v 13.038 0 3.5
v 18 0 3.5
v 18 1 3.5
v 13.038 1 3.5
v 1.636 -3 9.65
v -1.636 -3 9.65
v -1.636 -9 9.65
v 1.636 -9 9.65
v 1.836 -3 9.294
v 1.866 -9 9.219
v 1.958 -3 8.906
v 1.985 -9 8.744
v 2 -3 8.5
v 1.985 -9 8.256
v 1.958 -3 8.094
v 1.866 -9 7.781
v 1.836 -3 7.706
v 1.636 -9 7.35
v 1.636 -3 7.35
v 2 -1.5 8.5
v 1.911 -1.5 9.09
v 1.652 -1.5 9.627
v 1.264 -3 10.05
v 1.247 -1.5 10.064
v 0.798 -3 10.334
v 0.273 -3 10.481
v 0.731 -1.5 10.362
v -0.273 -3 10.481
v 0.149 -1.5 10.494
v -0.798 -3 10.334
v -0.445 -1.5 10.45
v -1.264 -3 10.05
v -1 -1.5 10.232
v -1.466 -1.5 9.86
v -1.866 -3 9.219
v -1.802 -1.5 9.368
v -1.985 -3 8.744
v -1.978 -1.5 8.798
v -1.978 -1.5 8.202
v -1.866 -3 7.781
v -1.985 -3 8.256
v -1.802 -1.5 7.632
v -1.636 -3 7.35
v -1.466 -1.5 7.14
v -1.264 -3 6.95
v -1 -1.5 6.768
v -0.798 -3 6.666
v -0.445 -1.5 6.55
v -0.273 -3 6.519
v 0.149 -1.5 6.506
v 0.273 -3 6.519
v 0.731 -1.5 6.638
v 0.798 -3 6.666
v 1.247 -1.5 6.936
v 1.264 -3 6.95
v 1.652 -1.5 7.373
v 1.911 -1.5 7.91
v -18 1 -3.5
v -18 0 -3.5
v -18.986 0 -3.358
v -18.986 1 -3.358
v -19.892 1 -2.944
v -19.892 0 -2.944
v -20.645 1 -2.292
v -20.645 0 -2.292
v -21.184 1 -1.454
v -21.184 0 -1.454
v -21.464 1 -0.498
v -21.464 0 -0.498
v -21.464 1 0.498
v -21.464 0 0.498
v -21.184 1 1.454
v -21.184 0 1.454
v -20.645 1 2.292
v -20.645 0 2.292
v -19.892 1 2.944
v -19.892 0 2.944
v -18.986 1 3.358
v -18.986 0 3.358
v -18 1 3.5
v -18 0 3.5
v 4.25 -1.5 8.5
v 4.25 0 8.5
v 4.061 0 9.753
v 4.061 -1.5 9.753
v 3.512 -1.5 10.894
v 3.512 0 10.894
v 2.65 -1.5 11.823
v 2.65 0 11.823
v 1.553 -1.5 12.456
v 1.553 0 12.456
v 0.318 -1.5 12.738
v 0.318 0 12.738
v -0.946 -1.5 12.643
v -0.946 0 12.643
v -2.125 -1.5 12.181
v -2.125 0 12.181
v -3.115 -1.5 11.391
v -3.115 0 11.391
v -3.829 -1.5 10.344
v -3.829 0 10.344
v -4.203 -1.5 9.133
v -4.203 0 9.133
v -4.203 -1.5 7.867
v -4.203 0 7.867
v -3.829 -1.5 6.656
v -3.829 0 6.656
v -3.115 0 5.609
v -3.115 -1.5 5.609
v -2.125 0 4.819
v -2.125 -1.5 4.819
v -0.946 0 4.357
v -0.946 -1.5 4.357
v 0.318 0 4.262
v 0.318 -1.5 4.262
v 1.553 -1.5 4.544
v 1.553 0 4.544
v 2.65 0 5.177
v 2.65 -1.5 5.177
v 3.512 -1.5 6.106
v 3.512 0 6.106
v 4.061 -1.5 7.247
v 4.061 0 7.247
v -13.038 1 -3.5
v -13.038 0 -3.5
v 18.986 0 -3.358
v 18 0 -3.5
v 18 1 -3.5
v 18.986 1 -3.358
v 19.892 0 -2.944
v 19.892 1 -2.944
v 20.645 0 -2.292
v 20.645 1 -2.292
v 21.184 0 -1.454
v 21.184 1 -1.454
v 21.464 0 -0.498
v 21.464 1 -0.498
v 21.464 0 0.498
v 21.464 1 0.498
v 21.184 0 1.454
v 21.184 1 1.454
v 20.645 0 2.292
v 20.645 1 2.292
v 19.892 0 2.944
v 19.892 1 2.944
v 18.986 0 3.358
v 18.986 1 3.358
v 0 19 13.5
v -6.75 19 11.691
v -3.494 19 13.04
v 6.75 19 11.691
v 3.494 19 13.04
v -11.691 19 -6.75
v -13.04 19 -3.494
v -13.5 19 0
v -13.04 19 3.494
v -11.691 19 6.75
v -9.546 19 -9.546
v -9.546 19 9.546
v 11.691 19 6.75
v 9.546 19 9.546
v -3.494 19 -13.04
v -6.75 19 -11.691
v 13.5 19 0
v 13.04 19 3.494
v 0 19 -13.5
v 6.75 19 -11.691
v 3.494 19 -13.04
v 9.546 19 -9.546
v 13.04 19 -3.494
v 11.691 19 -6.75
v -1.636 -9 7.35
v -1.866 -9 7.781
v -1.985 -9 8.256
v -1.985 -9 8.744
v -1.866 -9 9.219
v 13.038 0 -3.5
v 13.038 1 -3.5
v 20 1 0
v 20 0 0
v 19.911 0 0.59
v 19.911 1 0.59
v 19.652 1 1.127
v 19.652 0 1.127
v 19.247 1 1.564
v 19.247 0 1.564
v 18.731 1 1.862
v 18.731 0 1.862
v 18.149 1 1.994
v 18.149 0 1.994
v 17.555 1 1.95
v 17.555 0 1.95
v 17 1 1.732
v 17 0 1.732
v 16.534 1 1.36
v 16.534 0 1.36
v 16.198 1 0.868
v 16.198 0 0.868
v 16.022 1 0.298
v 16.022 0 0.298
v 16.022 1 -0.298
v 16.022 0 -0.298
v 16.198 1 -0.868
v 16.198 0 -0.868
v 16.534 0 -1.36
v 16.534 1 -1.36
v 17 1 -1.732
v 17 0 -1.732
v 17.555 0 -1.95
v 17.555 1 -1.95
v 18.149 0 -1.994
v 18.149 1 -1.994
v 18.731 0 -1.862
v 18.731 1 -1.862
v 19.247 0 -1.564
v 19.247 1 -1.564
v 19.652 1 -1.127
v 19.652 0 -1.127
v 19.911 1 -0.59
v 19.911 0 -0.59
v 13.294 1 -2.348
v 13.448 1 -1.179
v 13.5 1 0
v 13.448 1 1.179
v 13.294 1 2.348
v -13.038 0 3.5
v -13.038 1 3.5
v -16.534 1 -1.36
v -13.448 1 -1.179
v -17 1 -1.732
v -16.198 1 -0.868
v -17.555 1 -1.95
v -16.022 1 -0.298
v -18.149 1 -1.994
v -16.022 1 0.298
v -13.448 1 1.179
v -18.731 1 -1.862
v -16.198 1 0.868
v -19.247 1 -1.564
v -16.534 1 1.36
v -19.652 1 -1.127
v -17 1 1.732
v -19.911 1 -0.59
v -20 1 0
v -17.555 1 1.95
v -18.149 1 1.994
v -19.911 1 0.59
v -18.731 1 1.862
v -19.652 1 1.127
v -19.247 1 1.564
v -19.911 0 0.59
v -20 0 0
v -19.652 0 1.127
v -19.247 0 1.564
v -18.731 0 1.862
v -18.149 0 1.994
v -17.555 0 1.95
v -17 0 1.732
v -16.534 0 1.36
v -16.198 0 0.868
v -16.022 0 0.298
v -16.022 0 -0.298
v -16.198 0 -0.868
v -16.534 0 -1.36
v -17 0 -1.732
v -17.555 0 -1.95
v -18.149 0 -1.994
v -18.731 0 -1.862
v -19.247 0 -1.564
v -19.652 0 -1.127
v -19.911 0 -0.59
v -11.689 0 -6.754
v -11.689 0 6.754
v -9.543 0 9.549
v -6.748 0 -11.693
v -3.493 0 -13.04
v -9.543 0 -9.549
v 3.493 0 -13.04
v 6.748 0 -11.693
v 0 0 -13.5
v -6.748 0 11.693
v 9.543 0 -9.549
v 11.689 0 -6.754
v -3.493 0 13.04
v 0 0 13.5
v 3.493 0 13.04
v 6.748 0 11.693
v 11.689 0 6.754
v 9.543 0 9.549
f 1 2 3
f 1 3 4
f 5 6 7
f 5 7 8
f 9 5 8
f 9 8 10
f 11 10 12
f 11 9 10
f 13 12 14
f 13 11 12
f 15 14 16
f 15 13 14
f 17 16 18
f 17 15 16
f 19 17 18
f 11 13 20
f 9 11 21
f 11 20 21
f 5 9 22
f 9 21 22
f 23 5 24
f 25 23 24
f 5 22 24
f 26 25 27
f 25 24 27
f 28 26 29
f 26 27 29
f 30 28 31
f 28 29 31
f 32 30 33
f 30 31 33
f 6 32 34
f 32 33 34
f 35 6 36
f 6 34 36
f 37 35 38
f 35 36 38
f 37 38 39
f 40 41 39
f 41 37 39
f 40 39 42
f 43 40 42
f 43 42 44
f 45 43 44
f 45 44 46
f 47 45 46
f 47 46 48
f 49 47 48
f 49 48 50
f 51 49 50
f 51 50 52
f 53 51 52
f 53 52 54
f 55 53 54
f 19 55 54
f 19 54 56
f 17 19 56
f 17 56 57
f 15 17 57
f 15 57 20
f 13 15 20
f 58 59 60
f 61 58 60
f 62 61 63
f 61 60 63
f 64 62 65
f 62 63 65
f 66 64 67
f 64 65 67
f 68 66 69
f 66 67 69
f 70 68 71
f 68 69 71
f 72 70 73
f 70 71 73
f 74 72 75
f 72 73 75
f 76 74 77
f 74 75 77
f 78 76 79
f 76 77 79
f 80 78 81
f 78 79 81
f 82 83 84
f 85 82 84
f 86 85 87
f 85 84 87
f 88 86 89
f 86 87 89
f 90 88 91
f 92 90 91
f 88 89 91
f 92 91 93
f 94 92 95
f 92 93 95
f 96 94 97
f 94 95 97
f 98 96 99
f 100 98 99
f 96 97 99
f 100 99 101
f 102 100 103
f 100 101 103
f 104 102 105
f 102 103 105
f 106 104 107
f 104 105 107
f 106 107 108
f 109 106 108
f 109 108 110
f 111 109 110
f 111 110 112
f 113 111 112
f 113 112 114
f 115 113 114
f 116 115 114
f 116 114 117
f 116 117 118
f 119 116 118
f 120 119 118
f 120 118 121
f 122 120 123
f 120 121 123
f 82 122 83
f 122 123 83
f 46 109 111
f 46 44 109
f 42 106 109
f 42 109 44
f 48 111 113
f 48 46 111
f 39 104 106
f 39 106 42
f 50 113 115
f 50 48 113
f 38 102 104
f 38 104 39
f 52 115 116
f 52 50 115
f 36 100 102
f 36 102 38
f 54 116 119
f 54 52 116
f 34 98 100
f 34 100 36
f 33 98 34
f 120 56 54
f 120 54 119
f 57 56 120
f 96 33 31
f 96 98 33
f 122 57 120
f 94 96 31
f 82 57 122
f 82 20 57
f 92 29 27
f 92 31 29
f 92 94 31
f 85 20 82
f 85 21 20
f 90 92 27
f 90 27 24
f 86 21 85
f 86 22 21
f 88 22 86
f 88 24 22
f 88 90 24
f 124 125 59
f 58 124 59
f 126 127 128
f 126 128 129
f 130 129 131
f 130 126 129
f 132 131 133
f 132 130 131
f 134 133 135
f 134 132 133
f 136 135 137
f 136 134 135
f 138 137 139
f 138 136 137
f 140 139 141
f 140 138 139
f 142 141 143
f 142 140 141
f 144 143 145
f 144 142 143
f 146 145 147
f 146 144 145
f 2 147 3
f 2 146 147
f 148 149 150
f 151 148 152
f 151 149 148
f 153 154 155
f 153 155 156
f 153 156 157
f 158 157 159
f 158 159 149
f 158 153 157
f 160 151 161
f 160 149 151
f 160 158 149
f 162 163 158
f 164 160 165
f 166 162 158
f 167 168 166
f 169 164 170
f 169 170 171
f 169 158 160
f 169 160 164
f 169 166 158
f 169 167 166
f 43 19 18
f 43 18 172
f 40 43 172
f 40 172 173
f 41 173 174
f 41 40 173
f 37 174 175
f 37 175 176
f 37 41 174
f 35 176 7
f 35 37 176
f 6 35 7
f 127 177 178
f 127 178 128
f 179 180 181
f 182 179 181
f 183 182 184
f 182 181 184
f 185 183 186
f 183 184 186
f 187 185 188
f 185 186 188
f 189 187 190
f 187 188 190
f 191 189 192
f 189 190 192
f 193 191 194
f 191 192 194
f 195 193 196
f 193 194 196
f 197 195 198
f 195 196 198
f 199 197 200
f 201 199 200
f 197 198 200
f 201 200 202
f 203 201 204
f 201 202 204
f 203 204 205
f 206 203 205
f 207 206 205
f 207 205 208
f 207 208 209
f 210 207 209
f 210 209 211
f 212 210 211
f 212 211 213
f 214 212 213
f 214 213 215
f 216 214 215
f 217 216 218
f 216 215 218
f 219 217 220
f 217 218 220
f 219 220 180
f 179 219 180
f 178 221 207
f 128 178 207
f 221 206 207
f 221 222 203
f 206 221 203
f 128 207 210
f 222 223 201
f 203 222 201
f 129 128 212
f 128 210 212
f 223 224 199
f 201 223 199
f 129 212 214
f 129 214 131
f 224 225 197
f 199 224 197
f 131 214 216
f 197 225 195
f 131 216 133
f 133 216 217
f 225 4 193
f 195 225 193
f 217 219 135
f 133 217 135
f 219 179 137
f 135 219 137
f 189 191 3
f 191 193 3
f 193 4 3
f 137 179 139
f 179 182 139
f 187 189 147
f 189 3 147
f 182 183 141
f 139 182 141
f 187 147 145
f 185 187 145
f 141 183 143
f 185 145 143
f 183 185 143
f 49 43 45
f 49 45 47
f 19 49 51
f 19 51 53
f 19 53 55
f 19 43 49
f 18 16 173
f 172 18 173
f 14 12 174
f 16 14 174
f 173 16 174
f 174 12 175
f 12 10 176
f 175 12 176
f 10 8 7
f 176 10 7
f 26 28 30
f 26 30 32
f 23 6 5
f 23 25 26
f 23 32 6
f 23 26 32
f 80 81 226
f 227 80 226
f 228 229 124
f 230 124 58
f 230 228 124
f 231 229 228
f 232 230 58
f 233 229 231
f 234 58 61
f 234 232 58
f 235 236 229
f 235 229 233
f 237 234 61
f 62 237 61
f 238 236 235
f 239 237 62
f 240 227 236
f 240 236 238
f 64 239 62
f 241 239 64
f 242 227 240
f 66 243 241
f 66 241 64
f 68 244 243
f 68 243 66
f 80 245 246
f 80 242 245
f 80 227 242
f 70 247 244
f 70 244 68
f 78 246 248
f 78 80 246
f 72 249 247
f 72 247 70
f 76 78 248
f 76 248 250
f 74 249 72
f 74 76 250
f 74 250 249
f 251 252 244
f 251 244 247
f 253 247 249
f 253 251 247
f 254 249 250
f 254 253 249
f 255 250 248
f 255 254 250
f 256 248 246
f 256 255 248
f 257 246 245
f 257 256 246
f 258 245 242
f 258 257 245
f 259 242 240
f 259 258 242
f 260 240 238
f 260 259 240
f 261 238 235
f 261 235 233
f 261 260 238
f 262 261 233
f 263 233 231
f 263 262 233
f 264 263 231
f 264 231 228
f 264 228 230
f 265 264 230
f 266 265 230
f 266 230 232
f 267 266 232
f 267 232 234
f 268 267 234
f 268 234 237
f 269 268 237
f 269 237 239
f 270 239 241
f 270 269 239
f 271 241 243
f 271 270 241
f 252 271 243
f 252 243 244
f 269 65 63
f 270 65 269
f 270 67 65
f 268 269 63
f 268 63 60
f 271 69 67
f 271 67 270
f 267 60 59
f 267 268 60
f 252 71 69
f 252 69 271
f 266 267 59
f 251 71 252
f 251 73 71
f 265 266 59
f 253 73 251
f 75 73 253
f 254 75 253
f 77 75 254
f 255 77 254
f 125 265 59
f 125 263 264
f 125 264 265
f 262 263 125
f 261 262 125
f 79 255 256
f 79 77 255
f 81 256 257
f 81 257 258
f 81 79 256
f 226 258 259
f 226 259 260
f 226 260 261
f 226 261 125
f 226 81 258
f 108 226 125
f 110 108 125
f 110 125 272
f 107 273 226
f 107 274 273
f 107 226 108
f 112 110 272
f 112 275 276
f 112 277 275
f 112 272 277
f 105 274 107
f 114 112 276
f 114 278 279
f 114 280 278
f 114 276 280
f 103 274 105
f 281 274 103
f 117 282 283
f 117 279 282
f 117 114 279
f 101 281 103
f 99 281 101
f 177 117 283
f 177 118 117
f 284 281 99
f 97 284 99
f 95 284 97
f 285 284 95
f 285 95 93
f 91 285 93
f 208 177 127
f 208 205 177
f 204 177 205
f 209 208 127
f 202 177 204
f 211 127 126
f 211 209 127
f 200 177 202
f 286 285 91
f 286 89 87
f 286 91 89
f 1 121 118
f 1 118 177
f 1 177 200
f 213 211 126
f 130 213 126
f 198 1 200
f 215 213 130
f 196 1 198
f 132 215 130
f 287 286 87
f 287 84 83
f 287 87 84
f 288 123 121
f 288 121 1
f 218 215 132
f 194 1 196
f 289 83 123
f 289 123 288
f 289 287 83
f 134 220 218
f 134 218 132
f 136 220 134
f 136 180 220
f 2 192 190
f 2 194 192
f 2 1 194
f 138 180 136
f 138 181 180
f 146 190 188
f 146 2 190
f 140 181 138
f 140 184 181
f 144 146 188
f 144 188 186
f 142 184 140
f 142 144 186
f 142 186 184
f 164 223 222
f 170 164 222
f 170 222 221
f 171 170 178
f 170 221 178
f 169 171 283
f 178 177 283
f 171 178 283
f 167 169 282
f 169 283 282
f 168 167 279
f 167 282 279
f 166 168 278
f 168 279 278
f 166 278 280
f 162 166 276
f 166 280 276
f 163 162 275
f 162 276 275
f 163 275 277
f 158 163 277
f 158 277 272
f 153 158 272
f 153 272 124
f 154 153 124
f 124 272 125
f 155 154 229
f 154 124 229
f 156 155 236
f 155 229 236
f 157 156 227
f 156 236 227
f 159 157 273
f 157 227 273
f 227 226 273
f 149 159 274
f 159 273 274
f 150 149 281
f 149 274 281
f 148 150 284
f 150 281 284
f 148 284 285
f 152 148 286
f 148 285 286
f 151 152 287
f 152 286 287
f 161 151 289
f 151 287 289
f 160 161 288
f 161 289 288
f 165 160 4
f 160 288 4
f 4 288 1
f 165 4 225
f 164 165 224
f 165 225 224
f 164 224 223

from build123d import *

# Parameters (mm, degrees)
SKETCH1_R           = 13.5
BOSS_EXTRUDE1_DEPTH = 19
SKETCH2_R           = 2
BOSS_EXTRUDE2_DEPTH = 1
SKETCH4_R           = 4.25
BOSS_EXTRUDE3_DEPTH = 1.5
SKETCH5_R           = 2
BOSS_EXTRUDE4_DEPTH = 1.5
BOSS_EXTRUDE5_DEPTH = 6


with BuildPart() as part:
    # Sketch1 → Boss-Extrude1 (new body)
    with BuildSketch(Plane(origin=(0, 0, 0), x_dir=(1, 0, 0), z_dir=(0, 1, 0))):
        Circle(SKETCH1_R)
    extrude(amount=BOSS_EXTRUDE1_DEPTH)

    # Sketch2 → Boss-Extrude2 (add)
    with BuildSketch(Plane.XZ):
        with BuildLine():
            Line((18, 3.5), (13.038405, 3.5))
            ThreePointArc((13.038405, 3.5), (13.5, 0), (13.038405, -3.5))
            Line((13.038405, -3.5), (18, -3.5))
            ThreePointArc((18, -3.5), (21.5, 0), (18, 3.5))
        make_face()
        with Locations((18, 0)):
            Circle(SKETCH2_R, mode=Mode.SUBTRACT)
    boss_extrude2 = extrude(amount=-BOSS_EXTRUDE2_DEPTH)

    # Mirror1: Boss-Extrude2 across plane
    add(boss_extrude2.mirror(Plane(origin=(0, 0, 0), x_dir=(0, 0, 1), z_dir=(1, 0, 0))))

    # Sketch4 → Boss-Extrude3 (add)
    with BuildSketch(Plane.XZ):
        with Locations((0, 8.5)):
            Circle(SKETCH4_R)
    extrude(amount=BOSS_EXTRUDE3_DEPTH)

    # Sketch5 → Boss-Extrude4 (add)
    with BuildSketch(Plane.XZ.offset(1.5)):
        with Locations((0, 8.5)):
            Circle(SKETCH5_R)
    extrude(amount=BOSS_EXTRUDE4_DEPTH)

    # Sketch6 → Boss-Extrude5 (add)
    with BuildSketch(Plane.XZ.offset(3)):
        with BuildLine():
            Line((-1.636307, 9.65), (1.636307, 9.65))
            ThreePointArc((1.636307, 9.65), (2, 8.5), (1.636307, 7.35))
            Line((1.636307, 7.35), (-1.636307, 7.35))
            ThreePointArc((-1.636307, 7.35), (-2, 8.5), (-1.636307, 9.65))
        make_face()
    extrude(amount=BOSS_EXTRUDE5_DEPTH)


solid = part.part
